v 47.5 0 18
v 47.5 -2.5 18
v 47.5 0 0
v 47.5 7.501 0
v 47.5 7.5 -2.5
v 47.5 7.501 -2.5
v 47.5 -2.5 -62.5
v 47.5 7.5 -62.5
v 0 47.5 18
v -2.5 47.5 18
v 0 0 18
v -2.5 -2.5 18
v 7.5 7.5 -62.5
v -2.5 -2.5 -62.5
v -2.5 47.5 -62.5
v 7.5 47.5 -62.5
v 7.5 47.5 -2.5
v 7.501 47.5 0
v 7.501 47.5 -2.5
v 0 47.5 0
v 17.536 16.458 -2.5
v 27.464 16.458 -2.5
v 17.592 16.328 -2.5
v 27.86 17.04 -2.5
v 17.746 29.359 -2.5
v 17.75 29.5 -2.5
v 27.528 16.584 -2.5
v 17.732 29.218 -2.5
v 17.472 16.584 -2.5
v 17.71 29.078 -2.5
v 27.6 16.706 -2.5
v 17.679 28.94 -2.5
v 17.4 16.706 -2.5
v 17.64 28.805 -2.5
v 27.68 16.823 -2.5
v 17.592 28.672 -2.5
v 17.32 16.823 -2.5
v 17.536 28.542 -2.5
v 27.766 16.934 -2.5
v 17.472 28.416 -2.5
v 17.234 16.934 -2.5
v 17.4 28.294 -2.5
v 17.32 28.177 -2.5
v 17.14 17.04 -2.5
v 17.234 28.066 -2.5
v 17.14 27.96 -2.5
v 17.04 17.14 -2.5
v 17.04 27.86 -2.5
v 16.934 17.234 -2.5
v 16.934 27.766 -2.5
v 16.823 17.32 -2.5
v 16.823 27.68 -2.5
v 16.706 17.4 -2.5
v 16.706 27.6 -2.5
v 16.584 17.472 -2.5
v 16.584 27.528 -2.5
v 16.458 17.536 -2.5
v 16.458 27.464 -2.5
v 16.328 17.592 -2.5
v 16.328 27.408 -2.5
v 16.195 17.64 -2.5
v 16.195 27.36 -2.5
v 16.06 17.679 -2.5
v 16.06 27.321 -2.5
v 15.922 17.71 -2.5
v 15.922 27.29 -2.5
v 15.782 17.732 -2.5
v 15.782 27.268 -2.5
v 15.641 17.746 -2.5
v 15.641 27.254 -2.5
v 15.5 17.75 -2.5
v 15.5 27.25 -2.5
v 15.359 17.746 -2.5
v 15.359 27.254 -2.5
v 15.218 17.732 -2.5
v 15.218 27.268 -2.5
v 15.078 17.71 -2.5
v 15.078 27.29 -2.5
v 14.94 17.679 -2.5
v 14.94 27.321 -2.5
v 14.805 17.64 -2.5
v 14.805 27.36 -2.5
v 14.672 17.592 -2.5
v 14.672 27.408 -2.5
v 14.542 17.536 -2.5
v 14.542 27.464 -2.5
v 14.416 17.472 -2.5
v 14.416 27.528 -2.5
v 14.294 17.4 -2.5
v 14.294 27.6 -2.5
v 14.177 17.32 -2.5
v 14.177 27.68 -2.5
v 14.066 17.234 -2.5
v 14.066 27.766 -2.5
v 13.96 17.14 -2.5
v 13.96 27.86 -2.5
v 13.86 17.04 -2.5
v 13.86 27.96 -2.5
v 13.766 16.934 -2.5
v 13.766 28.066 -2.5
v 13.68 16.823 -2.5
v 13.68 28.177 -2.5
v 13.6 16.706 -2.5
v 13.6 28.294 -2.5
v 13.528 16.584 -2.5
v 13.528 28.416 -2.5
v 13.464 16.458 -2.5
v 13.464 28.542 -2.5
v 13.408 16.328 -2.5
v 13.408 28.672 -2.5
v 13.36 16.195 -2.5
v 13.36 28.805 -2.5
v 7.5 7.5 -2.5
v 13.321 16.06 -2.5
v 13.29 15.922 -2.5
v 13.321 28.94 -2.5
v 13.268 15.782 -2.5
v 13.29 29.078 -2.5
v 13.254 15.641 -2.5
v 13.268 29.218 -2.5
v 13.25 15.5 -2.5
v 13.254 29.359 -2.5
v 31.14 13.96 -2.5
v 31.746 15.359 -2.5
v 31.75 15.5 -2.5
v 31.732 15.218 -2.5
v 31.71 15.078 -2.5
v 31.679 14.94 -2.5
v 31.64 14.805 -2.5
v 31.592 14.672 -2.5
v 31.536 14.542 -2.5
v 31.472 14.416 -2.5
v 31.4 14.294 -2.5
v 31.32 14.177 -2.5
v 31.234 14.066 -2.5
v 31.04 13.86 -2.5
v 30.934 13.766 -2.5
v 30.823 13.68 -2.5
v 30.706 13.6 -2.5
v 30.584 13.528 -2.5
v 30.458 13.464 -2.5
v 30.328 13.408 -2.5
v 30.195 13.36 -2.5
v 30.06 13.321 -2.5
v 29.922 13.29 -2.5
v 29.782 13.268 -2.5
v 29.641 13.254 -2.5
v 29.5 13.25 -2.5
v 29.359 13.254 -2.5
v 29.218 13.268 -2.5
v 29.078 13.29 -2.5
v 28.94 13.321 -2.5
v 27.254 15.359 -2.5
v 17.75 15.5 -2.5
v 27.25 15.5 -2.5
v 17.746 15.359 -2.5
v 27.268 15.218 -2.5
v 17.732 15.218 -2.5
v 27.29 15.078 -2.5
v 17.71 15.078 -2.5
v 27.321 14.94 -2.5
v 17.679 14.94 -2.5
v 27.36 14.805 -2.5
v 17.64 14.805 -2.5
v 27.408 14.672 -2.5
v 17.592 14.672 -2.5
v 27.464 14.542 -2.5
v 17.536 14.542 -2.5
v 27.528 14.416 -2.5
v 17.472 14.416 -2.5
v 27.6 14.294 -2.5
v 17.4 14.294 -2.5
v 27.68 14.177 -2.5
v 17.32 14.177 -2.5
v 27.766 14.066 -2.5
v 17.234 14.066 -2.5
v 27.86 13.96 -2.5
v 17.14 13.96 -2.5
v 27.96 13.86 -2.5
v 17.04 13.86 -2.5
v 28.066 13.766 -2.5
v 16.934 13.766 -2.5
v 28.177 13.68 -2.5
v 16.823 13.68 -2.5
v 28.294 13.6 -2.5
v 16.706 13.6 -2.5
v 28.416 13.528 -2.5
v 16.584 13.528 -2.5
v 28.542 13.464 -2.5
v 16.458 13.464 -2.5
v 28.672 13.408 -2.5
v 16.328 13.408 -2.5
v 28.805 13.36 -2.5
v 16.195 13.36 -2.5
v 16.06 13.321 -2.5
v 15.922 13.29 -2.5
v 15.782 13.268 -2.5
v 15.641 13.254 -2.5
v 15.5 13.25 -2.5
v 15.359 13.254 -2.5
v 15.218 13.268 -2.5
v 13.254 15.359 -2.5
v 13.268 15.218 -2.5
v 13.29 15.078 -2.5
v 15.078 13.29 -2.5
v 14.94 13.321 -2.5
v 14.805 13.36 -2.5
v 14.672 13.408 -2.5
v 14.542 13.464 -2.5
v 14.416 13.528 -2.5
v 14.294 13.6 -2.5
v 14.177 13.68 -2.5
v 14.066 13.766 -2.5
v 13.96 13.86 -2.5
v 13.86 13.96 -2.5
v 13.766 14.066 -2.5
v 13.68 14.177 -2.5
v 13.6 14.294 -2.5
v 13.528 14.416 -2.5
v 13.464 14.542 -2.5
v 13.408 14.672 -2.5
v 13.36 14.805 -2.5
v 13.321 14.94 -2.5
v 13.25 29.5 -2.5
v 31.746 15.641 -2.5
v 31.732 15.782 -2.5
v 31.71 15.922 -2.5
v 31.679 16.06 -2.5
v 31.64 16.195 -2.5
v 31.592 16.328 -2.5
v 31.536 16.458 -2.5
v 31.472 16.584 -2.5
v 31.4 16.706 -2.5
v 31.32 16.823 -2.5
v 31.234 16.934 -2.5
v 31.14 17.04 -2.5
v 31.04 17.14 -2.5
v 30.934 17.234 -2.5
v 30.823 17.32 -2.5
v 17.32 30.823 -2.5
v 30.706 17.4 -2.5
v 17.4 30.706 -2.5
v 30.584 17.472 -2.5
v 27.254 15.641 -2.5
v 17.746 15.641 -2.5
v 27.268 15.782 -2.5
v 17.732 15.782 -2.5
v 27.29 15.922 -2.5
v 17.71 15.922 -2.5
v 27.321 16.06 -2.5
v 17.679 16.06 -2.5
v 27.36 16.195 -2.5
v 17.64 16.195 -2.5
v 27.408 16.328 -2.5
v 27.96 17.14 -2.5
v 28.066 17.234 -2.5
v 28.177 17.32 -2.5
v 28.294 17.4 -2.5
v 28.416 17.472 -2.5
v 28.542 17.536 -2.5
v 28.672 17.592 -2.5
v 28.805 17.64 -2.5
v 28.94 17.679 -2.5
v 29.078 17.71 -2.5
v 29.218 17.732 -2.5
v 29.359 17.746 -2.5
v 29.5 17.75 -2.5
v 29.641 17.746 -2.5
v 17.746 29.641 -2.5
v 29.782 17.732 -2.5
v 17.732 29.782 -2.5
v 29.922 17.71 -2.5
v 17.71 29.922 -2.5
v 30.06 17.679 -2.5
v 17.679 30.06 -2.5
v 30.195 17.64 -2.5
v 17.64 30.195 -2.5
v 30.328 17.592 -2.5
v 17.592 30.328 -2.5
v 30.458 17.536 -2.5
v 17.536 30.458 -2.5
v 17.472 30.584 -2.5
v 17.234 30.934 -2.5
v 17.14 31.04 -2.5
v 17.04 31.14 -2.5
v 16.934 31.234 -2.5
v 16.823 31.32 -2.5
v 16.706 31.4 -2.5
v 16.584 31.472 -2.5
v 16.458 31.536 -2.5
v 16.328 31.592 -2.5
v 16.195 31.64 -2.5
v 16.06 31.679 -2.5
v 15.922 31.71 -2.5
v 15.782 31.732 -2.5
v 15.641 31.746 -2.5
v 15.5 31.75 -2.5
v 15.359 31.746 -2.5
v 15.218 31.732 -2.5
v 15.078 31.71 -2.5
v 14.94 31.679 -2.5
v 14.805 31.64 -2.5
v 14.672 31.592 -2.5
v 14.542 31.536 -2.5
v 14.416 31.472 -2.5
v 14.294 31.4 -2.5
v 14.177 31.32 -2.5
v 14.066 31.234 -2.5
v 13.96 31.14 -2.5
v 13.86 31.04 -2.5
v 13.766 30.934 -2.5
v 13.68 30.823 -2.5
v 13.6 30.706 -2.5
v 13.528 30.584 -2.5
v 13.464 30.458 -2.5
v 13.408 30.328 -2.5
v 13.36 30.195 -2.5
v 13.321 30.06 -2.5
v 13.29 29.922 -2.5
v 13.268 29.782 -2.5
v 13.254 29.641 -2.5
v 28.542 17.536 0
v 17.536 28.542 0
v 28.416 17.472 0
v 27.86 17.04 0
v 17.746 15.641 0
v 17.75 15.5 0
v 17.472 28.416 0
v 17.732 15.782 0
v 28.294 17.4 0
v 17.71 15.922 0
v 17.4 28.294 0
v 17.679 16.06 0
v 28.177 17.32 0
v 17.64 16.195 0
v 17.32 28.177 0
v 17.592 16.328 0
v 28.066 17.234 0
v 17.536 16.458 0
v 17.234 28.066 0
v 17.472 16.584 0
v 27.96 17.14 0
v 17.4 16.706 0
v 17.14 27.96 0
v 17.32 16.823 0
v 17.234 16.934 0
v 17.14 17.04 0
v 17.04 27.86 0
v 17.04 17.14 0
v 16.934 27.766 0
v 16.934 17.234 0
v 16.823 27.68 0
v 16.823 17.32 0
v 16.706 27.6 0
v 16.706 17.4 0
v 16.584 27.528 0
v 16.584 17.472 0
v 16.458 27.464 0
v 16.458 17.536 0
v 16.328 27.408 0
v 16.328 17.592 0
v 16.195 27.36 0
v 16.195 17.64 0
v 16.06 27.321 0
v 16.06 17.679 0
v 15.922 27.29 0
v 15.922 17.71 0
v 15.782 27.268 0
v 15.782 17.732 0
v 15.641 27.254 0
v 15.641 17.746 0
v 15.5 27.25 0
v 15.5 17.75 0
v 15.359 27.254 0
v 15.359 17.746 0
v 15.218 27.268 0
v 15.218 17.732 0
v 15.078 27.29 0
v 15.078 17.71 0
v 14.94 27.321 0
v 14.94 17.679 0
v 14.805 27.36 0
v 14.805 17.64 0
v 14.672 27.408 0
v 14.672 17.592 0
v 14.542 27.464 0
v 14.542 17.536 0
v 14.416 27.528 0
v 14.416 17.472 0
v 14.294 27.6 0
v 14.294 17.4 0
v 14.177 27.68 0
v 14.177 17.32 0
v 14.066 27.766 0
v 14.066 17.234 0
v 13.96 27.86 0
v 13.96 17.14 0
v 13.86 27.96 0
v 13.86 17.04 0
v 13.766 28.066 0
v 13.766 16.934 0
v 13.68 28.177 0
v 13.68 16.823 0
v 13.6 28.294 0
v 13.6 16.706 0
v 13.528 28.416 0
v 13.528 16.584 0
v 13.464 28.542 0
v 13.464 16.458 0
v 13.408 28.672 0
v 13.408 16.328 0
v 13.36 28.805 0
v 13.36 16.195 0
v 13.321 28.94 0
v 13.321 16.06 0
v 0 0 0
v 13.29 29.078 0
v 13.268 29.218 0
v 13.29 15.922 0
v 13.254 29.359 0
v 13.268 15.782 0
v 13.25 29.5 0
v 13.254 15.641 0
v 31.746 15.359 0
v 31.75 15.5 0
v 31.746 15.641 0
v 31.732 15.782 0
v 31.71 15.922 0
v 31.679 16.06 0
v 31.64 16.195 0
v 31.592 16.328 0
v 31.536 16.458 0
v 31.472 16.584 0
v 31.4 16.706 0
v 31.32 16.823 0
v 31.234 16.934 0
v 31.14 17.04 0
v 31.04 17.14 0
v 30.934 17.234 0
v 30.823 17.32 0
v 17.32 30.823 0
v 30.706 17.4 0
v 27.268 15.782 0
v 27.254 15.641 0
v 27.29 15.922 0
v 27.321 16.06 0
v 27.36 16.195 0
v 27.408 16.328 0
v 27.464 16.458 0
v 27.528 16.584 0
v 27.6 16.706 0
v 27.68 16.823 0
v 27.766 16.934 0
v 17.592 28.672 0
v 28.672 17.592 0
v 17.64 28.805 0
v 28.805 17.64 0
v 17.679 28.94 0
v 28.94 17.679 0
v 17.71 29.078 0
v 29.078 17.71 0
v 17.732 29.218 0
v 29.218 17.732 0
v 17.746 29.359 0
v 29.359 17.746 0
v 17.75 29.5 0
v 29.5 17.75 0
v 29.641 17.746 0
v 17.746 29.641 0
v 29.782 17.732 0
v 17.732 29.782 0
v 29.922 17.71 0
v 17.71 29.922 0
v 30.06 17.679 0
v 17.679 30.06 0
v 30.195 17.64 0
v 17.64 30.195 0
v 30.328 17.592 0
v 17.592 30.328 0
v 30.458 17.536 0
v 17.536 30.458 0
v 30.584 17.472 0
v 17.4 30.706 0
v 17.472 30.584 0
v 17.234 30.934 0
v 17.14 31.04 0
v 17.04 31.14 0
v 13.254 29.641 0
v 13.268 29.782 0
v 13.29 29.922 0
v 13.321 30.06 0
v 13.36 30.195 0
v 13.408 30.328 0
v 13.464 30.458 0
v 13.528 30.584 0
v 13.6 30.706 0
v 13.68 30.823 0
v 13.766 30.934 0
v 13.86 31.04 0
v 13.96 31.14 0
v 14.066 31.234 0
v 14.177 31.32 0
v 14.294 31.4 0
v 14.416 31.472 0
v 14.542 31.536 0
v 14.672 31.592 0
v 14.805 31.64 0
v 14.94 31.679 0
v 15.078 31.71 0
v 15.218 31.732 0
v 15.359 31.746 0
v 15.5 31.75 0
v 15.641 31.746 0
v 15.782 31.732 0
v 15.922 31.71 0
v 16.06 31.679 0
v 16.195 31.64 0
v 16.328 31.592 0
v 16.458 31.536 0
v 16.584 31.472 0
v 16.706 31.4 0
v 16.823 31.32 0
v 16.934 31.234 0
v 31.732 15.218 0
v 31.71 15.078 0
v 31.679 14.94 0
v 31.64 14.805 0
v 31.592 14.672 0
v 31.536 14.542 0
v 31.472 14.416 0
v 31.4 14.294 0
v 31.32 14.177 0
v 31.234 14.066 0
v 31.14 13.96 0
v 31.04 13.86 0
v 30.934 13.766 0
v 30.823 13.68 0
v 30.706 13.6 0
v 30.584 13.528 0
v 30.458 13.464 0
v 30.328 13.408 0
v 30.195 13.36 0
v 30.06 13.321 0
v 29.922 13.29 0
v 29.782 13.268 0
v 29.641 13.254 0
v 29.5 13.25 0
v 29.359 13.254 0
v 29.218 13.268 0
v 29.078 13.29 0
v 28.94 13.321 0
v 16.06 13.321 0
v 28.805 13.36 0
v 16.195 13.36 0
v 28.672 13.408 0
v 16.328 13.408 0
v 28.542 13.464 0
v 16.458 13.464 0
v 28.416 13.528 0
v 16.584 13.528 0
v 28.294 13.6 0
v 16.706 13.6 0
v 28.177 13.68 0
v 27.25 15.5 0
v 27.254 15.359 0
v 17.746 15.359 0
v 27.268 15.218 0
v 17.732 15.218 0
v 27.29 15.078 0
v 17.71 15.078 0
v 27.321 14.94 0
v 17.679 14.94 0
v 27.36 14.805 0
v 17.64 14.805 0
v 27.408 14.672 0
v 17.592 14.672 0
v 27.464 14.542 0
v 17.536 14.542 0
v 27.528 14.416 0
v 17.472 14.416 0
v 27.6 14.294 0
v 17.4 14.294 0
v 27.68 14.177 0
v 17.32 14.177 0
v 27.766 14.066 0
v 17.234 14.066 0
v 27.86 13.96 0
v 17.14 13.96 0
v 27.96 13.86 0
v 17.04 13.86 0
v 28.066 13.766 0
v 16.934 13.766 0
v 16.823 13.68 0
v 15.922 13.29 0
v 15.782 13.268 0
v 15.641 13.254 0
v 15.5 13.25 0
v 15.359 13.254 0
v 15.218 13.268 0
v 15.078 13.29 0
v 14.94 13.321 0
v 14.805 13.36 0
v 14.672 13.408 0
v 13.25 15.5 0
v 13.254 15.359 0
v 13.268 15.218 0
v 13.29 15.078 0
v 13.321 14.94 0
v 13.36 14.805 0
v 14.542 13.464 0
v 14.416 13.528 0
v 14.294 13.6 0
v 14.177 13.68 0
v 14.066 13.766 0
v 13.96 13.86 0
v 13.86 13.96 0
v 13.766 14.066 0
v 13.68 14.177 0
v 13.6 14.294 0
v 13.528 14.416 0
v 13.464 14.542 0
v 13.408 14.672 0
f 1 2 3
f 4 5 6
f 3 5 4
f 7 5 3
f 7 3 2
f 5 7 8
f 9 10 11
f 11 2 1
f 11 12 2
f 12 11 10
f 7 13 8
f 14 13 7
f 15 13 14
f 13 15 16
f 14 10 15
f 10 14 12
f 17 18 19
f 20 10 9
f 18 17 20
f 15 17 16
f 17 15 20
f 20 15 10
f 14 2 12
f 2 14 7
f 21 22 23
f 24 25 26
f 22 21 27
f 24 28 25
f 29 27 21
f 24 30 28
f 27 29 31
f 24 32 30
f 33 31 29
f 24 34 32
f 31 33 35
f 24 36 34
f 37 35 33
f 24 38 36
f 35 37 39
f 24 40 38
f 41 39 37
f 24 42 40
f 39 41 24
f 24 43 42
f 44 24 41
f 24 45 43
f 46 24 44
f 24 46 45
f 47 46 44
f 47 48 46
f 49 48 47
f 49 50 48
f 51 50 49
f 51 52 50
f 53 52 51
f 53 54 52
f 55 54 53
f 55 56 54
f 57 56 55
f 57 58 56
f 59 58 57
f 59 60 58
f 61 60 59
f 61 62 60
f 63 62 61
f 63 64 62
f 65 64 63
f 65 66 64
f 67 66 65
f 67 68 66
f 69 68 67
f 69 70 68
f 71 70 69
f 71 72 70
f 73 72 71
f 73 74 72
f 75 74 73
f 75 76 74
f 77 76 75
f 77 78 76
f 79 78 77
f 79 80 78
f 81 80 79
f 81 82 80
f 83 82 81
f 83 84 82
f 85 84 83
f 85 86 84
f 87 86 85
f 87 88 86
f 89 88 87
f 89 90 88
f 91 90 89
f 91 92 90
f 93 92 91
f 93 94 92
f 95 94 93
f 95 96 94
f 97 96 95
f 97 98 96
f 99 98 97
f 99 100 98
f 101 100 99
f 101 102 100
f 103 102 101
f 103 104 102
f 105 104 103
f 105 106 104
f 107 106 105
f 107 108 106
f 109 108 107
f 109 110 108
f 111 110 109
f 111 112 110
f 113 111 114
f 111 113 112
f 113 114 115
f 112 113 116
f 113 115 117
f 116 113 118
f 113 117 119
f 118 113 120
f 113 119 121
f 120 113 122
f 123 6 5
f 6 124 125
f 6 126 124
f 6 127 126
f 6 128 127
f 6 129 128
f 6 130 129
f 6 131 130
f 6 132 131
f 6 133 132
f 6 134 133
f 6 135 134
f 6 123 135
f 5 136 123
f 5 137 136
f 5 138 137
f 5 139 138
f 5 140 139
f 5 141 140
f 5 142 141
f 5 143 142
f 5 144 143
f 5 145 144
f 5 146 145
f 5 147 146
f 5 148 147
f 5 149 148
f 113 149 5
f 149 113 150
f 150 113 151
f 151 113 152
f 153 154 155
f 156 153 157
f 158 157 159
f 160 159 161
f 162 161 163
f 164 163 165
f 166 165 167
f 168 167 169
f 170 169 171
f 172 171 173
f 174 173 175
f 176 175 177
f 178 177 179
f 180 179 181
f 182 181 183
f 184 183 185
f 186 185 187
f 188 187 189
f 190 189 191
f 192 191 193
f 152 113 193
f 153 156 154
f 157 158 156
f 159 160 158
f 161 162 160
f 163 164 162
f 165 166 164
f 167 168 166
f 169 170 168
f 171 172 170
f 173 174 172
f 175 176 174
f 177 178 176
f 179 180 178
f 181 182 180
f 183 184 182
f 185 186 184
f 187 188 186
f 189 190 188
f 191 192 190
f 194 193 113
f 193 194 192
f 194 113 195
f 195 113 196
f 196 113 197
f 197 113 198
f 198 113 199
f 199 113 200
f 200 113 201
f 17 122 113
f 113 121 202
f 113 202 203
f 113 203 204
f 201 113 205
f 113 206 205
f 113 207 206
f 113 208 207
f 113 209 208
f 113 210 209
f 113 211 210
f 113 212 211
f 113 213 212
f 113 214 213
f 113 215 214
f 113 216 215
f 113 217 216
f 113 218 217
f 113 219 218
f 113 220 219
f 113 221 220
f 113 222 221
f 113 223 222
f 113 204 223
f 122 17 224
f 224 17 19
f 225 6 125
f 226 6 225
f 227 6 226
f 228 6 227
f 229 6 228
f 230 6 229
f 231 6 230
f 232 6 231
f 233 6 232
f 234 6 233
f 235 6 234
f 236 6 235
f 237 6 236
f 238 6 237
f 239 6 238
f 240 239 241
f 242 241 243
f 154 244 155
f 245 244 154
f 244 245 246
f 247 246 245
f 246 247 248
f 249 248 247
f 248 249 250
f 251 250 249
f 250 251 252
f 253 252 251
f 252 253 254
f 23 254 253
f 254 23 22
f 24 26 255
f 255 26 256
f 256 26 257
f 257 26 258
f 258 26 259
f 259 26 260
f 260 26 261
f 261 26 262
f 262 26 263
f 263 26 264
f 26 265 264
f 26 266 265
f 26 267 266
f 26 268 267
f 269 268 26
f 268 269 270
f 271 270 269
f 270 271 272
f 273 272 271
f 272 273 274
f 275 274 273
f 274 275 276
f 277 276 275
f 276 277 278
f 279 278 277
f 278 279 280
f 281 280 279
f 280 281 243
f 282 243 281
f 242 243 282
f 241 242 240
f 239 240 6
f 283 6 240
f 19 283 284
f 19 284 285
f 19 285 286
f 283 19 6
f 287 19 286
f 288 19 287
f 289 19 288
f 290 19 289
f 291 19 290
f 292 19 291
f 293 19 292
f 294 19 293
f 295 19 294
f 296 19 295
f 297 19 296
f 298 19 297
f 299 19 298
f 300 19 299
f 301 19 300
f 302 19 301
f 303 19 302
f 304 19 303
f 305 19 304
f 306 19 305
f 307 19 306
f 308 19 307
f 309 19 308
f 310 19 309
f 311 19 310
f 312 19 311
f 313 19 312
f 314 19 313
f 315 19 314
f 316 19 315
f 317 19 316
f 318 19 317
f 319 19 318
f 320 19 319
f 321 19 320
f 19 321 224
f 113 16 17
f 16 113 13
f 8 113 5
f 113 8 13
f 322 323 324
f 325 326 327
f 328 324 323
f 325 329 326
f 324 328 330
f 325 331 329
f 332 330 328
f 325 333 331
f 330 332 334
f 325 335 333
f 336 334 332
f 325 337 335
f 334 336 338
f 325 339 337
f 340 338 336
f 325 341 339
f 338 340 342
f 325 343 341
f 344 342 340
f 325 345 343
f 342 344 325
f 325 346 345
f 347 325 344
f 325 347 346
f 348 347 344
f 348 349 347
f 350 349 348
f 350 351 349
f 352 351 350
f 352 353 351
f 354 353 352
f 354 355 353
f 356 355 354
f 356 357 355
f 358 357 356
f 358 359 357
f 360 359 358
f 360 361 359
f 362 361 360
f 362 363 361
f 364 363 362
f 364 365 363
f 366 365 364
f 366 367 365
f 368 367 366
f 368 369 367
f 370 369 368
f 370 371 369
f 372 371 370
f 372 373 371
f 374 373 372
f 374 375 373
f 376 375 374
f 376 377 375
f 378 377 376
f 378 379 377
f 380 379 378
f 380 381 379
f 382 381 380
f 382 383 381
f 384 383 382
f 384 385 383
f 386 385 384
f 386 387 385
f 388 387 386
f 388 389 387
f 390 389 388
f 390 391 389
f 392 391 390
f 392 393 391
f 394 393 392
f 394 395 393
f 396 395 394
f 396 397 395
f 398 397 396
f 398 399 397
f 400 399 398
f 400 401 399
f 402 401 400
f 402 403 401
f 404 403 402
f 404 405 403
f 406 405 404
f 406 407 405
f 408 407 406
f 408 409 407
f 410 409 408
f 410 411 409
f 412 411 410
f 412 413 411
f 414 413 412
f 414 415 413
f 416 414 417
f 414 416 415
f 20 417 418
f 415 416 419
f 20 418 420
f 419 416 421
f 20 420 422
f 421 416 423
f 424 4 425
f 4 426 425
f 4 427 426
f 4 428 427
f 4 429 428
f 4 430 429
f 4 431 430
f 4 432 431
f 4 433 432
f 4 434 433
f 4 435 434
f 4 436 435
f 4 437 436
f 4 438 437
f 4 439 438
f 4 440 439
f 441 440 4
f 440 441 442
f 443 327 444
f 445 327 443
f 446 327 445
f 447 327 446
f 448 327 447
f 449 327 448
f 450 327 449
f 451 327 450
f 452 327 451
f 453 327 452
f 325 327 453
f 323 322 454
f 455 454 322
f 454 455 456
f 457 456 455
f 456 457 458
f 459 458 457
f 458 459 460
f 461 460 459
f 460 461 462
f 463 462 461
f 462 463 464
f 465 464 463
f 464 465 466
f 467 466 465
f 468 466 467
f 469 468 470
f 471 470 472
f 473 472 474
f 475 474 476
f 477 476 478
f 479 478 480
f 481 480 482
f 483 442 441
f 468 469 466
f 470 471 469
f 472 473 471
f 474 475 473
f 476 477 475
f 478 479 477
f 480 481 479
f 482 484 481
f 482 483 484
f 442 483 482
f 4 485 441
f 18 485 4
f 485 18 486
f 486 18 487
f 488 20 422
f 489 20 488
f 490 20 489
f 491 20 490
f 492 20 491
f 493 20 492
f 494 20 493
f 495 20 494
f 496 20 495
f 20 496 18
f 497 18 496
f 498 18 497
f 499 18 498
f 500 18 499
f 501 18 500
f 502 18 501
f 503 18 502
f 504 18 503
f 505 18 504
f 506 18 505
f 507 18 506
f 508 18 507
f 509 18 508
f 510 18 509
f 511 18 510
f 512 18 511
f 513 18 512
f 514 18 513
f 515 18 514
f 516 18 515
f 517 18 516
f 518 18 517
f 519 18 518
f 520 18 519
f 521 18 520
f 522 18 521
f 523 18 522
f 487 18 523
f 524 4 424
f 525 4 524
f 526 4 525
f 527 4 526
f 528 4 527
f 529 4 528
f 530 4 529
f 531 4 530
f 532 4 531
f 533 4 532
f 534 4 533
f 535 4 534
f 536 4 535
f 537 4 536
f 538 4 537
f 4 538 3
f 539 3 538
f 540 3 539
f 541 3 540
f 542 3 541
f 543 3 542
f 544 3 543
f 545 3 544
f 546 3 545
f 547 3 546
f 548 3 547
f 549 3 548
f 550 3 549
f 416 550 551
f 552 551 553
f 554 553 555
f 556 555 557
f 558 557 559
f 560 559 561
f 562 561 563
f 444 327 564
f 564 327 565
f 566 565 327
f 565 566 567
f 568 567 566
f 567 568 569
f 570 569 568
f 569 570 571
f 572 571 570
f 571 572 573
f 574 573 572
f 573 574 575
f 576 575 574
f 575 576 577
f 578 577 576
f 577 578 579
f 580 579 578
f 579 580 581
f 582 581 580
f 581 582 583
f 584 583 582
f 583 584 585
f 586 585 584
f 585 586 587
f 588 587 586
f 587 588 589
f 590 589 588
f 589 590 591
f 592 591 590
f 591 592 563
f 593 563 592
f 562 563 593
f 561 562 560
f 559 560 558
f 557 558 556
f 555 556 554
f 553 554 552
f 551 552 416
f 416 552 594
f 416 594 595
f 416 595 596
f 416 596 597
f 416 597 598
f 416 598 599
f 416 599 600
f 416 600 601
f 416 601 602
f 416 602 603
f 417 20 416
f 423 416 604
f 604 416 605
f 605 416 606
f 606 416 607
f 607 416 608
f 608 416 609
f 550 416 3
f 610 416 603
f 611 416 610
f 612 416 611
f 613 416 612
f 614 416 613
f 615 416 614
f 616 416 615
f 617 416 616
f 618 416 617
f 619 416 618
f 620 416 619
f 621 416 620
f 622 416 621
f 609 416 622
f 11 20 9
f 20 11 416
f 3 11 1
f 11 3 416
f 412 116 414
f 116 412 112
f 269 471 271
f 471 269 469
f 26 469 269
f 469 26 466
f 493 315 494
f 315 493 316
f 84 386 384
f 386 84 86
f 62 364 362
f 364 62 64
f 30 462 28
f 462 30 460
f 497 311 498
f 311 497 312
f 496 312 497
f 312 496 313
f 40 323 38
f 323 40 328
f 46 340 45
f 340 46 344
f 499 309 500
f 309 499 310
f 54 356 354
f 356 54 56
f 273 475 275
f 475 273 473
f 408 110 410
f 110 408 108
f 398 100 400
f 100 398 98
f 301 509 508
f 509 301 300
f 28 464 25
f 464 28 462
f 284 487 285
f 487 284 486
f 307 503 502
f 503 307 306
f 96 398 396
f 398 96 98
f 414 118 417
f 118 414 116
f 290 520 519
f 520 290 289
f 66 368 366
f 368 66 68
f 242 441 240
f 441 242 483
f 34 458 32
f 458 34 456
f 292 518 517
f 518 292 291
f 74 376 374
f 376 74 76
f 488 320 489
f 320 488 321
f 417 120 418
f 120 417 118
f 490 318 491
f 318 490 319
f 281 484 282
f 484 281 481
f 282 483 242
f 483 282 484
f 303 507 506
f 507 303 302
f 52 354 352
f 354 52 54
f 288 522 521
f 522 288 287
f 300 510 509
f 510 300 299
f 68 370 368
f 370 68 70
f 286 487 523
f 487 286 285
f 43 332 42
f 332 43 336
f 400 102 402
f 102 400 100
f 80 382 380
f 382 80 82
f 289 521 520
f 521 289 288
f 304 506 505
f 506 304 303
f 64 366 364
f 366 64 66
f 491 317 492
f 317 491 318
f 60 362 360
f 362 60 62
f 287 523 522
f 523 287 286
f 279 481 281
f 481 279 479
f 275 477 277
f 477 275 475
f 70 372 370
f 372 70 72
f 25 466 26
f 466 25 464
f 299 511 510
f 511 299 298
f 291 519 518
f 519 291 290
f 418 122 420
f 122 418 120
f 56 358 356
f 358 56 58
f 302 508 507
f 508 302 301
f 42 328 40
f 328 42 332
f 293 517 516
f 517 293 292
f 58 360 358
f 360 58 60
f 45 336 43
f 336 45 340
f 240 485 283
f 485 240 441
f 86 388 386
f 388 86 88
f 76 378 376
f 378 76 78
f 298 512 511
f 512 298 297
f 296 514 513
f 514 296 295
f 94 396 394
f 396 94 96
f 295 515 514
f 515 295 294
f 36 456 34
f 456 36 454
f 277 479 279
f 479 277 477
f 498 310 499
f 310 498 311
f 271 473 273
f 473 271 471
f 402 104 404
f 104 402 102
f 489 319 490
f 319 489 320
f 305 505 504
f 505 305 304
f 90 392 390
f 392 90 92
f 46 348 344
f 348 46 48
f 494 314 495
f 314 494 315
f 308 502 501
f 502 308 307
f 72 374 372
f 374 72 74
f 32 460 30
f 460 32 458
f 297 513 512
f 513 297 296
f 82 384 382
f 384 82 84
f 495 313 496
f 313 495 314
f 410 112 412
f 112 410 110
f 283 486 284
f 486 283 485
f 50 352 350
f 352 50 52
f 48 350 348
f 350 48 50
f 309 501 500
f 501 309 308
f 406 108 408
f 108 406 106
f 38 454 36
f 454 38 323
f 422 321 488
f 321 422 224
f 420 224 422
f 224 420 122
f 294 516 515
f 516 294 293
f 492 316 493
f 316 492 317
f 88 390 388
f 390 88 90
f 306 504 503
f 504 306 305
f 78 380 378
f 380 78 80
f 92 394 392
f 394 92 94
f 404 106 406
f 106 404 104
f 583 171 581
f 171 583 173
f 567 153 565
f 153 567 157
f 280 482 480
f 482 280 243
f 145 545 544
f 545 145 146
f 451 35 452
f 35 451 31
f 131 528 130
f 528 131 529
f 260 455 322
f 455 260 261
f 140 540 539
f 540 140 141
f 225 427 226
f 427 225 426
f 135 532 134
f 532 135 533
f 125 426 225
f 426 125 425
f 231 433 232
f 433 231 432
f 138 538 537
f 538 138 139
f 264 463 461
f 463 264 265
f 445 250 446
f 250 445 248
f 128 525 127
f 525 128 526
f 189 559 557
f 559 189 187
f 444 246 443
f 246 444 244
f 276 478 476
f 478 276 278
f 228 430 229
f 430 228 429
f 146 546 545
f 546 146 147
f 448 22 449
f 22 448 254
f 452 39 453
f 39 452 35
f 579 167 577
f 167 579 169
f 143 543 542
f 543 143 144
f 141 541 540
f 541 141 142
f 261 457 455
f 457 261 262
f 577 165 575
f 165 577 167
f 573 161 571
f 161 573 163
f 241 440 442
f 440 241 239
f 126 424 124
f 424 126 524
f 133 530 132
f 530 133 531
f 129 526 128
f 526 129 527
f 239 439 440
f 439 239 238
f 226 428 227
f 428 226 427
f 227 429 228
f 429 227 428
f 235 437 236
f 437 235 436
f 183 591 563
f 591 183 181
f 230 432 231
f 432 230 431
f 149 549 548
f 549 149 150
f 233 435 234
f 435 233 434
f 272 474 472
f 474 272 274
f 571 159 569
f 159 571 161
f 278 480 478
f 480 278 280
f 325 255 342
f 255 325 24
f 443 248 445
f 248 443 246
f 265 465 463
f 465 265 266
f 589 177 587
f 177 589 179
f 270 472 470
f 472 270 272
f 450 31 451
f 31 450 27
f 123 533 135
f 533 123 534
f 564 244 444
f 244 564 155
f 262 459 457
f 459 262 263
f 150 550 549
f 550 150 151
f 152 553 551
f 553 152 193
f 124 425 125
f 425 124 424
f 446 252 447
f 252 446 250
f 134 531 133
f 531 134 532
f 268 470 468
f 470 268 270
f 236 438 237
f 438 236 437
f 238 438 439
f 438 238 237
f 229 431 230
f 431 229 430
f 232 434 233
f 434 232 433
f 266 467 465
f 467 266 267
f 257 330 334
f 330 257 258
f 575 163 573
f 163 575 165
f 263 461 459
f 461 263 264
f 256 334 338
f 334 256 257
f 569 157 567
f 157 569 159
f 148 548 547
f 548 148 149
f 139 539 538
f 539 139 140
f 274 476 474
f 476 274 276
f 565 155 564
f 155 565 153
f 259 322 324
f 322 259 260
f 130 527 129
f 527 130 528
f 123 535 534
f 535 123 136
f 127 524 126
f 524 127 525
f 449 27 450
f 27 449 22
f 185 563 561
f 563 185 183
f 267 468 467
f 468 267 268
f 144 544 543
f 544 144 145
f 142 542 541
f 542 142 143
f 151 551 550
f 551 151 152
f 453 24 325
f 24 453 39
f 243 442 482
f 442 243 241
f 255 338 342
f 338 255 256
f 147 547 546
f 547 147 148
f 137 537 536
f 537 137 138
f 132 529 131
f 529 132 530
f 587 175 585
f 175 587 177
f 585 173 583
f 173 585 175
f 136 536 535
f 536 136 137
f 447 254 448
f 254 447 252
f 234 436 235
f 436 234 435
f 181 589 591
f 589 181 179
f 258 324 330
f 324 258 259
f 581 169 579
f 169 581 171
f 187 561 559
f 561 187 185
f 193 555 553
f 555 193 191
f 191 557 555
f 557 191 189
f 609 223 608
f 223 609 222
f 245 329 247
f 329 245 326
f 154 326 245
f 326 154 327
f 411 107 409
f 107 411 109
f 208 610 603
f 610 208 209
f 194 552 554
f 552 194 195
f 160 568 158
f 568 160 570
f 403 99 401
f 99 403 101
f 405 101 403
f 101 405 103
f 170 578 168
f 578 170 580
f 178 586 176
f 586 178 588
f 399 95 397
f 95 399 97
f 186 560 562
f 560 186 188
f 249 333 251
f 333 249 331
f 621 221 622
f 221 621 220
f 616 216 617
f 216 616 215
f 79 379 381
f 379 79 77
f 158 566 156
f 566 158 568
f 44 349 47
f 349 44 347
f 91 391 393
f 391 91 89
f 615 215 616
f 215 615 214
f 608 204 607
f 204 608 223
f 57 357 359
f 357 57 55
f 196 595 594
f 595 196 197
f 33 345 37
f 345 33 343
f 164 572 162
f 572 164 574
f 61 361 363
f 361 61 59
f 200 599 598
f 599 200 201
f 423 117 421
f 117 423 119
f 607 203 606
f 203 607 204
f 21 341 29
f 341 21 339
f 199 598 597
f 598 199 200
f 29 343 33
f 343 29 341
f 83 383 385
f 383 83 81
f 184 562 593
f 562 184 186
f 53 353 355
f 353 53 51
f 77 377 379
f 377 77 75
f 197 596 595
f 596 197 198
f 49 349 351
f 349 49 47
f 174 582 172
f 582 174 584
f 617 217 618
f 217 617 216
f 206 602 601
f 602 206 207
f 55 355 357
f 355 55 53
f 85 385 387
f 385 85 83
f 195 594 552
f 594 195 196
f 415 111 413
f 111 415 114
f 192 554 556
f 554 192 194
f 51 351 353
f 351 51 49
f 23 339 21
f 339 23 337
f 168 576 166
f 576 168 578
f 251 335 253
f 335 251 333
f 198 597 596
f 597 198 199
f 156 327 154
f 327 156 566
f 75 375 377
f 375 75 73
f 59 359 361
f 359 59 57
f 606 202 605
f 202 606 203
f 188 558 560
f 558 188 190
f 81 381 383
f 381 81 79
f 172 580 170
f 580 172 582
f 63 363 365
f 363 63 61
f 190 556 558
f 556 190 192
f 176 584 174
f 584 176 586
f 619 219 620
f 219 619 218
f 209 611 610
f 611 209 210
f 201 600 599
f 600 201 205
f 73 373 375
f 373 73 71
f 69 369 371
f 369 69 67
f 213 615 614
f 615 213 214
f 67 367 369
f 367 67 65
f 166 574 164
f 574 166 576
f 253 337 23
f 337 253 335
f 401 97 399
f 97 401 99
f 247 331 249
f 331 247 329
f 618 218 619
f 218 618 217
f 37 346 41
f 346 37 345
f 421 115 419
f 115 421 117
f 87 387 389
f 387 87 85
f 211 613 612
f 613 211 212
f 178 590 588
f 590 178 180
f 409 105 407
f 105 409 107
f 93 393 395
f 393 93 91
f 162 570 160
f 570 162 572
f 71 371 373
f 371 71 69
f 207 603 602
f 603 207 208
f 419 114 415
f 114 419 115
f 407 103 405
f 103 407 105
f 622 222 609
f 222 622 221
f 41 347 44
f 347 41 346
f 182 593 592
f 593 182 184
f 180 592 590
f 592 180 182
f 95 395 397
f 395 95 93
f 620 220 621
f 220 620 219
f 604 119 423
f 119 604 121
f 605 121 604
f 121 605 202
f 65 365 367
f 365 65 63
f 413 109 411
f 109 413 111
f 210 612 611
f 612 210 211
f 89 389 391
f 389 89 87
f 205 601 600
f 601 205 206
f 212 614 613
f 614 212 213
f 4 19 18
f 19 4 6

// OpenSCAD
$fn=100;
base_thick = 18;
base_headroom = 60;
wall_thick = 2.5;

module corner()
{
    translate([wall_thick*-1,wall_thick*-1,base_headroom *-1 - wall_thick])
    difference()
    {
        cube([50,50,base_thick+wall_thick+base_headroom]);
        translate([10,10,-0.001])
            cube([40.001,40.001,base_headroom+0.001]);
        translate([wall_thick,wall_thick,base_headroom + wall_thick])
            cube([50.001 - wall_thick,50.001-wall_thick,base_thick+0.001]);
        translate([18,32,base_headroom-0.001])
            cylinder(d=4.5,h=wall_thick+0.002);
        translate([32,18,base_headroom-0.001])
            cylinder(d=4.5,h=wall_thick+0.002);
        translate([18,18,base_headroom-0.001])
            cylinder(d=4.5,h=wall_thick+0.002);
        hull()
        {
            translate([10.001,50.001,base_headroom-0.001])
                cylinder(d=0.001,h=wall_thick+0.002);
            translate([50.001,10.001,base_headroom-0.001])
                cylinder(d=0.001,h=wall_thick+0.002);
            translate([50.001,50.001,base_headroom-0.001])
                cylinder(d=0.001,h=wall_thick+0.002);
        }
    }
}

corner();

/*
rotate([90,0,0])
    corner();
translate([-2,0,0,])
    mirror([90,0,0])
        rotate([90,0,0])
            corner();
*/
